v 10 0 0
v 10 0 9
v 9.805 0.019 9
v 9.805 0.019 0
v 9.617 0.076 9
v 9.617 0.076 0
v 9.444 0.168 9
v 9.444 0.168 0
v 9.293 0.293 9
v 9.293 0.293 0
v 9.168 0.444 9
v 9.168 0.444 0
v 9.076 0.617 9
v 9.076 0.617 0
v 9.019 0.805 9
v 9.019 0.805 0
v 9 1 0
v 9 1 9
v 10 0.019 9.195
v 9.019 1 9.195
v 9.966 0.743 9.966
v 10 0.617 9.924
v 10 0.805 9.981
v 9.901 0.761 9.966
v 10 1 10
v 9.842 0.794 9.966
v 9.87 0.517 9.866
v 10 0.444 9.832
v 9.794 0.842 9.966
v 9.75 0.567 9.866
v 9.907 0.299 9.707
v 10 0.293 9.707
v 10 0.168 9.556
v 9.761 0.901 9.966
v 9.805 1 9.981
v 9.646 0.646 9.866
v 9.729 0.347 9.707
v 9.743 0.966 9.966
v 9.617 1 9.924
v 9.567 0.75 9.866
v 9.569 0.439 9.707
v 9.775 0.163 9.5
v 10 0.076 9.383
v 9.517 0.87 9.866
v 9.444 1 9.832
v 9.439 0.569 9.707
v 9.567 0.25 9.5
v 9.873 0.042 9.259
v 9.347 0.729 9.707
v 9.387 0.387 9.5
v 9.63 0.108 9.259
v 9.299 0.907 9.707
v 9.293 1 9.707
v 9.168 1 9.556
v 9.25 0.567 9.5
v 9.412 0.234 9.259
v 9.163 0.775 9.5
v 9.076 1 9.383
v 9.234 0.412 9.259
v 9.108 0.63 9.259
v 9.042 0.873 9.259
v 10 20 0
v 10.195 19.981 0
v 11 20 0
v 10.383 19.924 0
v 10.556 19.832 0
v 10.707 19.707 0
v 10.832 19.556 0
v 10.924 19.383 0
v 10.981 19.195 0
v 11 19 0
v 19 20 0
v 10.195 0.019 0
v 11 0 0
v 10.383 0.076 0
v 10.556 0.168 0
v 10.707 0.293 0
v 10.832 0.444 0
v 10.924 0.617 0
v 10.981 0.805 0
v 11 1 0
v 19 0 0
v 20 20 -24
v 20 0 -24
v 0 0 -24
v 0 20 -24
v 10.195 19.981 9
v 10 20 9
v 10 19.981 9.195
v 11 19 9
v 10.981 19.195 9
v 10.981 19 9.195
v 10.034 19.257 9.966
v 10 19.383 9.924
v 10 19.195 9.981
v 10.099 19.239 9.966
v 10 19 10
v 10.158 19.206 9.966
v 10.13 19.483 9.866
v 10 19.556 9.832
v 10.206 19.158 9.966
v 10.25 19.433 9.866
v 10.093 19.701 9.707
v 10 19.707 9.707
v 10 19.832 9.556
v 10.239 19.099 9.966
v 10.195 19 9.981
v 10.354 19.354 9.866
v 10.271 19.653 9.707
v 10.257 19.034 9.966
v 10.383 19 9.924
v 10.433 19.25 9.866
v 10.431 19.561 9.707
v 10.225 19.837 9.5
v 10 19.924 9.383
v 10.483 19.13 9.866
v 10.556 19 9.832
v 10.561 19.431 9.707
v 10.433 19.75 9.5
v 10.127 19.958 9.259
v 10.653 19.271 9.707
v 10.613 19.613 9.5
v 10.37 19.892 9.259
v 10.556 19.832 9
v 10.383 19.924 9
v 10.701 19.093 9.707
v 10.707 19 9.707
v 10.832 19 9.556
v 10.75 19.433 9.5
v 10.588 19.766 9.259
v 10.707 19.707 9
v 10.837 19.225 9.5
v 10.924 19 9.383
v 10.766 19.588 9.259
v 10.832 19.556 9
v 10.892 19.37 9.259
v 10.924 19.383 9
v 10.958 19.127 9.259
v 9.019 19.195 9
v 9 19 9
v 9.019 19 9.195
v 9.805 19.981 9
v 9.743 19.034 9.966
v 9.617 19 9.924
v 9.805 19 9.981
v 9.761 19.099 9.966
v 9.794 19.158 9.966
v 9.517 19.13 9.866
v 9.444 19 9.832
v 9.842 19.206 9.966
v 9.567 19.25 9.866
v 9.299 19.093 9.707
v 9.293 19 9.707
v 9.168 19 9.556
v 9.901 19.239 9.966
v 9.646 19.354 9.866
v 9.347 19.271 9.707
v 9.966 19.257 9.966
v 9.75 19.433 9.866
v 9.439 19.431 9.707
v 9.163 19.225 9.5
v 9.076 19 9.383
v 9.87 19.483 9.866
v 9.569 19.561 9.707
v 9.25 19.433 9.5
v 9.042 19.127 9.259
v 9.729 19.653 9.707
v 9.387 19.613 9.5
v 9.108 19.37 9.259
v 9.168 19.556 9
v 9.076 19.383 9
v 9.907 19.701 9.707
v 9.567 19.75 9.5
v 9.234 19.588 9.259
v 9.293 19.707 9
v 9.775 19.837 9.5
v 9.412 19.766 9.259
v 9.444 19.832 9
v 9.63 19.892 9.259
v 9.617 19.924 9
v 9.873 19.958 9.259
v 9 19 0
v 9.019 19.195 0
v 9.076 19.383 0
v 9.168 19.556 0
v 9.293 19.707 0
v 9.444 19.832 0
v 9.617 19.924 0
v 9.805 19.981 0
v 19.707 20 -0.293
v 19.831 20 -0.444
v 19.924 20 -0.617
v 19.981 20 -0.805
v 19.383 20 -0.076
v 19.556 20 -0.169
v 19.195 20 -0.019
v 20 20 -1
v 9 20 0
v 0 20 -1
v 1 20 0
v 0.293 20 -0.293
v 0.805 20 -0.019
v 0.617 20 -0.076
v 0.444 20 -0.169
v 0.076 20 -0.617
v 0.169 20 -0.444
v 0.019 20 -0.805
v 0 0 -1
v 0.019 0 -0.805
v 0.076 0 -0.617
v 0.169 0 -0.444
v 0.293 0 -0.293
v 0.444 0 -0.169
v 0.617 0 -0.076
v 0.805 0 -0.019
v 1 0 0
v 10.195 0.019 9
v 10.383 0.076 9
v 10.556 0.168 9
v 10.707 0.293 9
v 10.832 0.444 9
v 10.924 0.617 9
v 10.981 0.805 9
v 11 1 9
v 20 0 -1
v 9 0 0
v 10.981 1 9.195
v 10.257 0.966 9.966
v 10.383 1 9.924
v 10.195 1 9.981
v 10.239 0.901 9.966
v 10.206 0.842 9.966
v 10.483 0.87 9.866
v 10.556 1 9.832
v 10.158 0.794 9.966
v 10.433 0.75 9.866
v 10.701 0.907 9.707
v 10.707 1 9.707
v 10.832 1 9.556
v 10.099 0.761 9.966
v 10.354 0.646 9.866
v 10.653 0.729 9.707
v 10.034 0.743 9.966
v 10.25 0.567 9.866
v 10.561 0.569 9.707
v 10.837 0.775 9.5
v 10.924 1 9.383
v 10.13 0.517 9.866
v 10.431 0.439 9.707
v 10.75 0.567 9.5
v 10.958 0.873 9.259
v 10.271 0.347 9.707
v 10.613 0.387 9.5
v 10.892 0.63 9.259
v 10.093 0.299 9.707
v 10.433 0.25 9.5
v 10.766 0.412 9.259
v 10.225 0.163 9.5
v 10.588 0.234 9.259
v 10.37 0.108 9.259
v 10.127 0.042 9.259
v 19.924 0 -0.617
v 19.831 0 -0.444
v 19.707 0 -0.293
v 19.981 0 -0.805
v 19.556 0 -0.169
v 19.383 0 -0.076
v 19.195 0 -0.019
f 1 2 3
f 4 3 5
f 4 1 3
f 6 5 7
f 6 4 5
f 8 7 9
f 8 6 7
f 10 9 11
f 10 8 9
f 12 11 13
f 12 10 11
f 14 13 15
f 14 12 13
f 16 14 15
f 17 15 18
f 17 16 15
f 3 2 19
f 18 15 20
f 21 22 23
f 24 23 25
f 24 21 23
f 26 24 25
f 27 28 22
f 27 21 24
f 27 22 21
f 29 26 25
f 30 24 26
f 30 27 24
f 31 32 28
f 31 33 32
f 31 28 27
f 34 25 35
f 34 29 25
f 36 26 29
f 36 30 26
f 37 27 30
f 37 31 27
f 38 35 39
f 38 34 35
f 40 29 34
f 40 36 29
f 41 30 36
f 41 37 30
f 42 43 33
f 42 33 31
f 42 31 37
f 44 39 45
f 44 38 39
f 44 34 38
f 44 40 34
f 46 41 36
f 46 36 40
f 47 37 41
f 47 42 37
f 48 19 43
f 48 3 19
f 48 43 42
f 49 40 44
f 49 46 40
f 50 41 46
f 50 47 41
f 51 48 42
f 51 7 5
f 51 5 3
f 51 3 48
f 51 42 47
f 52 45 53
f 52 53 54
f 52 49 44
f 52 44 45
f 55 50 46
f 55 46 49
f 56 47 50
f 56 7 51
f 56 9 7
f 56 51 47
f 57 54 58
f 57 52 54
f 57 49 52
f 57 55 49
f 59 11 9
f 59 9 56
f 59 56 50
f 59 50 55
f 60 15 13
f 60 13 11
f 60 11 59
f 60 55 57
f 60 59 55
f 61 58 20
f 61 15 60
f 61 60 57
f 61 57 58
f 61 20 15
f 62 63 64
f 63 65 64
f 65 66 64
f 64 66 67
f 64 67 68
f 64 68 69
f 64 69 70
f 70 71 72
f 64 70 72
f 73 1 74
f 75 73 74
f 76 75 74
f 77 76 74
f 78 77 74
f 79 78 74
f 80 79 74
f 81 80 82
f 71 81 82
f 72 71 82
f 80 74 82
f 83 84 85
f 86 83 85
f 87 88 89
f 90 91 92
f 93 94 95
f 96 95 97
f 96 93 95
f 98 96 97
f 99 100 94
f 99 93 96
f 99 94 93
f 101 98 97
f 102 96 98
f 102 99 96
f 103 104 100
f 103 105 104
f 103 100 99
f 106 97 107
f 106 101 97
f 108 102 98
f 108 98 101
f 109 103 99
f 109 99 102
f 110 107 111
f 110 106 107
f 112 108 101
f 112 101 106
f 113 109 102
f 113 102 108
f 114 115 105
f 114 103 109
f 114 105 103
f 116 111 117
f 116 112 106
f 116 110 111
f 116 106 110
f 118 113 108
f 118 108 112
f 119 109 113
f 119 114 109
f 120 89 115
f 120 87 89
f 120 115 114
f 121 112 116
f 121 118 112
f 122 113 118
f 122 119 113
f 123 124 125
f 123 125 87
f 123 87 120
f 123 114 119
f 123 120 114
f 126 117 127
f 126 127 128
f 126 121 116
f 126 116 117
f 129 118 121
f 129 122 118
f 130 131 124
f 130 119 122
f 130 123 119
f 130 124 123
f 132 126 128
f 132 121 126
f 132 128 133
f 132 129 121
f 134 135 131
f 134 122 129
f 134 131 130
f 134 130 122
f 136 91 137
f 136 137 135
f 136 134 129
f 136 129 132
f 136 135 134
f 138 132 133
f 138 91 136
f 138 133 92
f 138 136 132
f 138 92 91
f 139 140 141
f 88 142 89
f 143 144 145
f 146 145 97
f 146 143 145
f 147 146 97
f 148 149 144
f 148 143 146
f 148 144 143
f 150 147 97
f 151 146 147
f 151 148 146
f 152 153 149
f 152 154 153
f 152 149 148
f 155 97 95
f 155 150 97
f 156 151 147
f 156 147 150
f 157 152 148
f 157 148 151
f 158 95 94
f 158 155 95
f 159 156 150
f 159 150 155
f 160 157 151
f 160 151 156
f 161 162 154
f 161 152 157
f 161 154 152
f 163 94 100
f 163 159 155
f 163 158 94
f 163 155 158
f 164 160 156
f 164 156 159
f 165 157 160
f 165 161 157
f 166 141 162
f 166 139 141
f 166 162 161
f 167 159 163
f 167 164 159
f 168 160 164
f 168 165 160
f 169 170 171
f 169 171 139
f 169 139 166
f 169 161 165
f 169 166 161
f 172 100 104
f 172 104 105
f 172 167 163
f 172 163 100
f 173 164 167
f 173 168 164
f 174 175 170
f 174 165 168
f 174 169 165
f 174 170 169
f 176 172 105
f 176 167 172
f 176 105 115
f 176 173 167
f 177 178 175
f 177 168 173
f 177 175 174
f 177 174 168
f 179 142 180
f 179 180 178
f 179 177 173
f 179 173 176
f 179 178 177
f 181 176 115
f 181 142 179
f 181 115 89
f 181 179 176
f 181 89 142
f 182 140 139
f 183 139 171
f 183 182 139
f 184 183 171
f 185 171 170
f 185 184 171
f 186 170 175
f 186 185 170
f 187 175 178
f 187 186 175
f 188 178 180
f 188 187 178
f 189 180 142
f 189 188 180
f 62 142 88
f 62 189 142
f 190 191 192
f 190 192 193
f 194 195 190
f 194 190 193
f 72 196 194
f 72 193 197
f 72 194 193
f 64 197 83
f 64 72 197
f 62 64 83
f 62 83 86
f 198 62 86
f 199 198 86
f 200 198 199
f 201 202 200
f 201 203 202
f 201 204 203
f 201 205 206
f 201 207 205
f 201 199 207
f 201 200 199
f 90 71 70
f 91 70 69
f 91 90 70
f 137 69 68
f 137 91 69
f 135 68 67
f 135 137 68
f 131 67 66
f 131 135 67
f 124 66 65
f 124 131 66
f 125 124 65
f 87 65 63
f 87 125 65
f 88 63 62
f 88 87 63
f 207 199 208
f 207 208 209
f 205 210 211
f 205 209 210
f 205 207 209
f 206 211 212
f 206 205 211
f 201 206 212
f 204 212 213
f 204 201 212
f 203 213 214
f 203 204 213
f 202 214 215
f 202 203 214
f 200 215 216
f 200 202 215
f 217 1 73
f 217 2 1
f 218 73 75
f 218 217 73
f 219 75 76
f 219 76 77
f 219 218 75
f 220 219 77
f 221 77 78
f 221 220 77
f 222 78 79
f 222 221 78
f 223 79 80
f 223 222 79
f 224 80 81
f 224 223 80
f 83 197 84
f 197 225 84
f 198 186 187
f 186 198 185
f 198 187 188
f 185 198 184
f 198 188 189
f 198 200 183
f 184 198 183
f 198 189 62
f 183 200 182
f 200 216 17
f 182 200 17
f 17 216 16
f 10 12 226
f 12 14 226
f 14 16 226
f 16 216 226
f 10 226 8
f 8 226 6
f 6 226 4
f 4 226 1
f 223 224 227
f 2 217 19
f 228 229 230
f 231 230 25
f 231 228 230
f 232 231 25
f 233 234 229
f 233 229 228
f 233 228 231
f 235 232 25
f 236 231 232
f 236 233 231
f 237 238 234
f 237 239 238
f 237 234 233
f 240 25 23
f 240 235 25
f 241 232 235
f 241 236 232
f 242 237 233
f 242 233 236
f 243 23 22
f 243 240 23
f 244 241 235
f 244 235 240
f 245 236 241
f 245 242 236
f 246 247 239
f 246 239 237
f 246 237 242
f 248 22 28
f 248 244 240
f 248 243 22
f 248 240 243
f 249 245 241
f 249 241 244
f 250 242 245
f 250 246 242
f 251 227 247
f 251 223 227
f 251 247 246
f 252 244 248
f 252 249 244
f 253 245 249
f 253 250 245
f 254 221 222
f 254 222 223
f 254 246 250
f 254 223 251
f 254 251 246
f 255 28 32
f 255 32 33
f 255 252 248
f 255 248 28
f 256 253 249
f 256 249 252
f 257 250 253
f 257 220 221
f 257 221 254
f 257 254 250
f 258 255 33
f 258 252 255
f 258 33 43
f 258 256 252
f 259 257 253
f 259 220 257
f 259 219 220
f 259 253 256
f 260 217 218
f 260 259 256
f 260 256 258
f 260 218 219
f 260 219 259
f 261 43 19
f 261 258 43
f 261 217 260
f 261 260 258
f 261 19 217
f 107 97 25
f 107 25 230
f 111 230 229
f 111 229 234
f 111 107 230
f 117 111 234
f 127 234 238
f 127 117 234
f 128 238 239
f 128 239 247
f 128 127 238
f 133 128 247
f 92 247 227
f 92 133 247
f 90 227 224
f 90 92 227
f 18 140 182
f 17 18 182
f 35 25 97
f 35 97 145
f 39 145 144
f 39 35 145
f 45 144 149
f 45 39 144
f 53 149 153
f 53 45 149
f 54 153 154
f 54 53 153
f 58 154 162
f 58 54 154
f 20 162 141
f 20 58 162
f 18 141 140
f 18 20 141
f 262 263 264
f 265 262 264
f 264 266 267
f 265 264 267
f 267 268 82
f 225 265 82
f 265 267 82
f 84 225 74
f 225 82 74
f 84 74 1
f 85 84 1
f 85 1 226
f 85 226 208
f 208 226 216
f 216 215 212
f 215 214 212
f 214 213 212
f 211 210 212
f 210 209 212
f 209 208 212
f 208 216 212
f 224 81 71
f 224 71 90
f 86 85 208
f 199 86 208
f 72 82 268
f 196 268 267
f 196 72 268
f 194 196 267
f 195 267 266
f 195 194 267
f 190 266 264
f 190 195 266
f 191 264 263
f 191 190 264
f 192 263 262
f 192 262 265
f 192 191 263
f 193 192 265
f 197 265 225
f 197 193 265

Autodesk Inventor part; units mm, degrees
ref_plane "YZ Plane" through (0, 0, 0) normal (1, 0, 0) x (0, 1, 0)
ref_plane "XZ Plane" through (0, 0, 0) normal (0, 1, 0) x (-1, 0, 0)
ref_plane "XY Plane" through (0, 0, 0) normal (0, 0, 1) x (1, 0, 0)
sketch "Sketch1" plane through (0, 0, 0) normal (0, 1, 0) x (-1, 0, 0)
  line L0 (0, 0) -> (-20, 0)
  line L1 (-20, 0) -> (-20, -24)
  line L2 (-20, -24) -> (0, -24)
  line L3 (0, -24) -> (0, 0)
  line L4 (-9, 0) -> (-11, 0)
  line L5 (-11, 0) -> (-11, 10)
  line L6 (-11, 10) -> (-9, 10)
  line L7 (-9, 10) -> (-9, 0)
  dimension "d0" = 20
  dimension "d1" = 24
  dimension "d2" = 2
  dimension "d3" = 10
  dimension "d4" = 9
extrude "Extrusion1" add sketch "Sketch1" along normal blind 20
fillet "Fillet1" radius 1 4 edges at (9, 20, 5) (9, 0, 5) (11, 0, 5) (11, 20, 5)
fillet "Fillet2" radius 1 4 edges at (11, 10, 10) (9.2927, 19.7073, 10) (9, 10, 10) (9.2927, 0.2927, 10)
fillet "Fillet3" radius 1 2 edges at (20, 10, 0) (0, 10, 0)
properties part number "veg_kapcs_erzekelo_meretezett"
